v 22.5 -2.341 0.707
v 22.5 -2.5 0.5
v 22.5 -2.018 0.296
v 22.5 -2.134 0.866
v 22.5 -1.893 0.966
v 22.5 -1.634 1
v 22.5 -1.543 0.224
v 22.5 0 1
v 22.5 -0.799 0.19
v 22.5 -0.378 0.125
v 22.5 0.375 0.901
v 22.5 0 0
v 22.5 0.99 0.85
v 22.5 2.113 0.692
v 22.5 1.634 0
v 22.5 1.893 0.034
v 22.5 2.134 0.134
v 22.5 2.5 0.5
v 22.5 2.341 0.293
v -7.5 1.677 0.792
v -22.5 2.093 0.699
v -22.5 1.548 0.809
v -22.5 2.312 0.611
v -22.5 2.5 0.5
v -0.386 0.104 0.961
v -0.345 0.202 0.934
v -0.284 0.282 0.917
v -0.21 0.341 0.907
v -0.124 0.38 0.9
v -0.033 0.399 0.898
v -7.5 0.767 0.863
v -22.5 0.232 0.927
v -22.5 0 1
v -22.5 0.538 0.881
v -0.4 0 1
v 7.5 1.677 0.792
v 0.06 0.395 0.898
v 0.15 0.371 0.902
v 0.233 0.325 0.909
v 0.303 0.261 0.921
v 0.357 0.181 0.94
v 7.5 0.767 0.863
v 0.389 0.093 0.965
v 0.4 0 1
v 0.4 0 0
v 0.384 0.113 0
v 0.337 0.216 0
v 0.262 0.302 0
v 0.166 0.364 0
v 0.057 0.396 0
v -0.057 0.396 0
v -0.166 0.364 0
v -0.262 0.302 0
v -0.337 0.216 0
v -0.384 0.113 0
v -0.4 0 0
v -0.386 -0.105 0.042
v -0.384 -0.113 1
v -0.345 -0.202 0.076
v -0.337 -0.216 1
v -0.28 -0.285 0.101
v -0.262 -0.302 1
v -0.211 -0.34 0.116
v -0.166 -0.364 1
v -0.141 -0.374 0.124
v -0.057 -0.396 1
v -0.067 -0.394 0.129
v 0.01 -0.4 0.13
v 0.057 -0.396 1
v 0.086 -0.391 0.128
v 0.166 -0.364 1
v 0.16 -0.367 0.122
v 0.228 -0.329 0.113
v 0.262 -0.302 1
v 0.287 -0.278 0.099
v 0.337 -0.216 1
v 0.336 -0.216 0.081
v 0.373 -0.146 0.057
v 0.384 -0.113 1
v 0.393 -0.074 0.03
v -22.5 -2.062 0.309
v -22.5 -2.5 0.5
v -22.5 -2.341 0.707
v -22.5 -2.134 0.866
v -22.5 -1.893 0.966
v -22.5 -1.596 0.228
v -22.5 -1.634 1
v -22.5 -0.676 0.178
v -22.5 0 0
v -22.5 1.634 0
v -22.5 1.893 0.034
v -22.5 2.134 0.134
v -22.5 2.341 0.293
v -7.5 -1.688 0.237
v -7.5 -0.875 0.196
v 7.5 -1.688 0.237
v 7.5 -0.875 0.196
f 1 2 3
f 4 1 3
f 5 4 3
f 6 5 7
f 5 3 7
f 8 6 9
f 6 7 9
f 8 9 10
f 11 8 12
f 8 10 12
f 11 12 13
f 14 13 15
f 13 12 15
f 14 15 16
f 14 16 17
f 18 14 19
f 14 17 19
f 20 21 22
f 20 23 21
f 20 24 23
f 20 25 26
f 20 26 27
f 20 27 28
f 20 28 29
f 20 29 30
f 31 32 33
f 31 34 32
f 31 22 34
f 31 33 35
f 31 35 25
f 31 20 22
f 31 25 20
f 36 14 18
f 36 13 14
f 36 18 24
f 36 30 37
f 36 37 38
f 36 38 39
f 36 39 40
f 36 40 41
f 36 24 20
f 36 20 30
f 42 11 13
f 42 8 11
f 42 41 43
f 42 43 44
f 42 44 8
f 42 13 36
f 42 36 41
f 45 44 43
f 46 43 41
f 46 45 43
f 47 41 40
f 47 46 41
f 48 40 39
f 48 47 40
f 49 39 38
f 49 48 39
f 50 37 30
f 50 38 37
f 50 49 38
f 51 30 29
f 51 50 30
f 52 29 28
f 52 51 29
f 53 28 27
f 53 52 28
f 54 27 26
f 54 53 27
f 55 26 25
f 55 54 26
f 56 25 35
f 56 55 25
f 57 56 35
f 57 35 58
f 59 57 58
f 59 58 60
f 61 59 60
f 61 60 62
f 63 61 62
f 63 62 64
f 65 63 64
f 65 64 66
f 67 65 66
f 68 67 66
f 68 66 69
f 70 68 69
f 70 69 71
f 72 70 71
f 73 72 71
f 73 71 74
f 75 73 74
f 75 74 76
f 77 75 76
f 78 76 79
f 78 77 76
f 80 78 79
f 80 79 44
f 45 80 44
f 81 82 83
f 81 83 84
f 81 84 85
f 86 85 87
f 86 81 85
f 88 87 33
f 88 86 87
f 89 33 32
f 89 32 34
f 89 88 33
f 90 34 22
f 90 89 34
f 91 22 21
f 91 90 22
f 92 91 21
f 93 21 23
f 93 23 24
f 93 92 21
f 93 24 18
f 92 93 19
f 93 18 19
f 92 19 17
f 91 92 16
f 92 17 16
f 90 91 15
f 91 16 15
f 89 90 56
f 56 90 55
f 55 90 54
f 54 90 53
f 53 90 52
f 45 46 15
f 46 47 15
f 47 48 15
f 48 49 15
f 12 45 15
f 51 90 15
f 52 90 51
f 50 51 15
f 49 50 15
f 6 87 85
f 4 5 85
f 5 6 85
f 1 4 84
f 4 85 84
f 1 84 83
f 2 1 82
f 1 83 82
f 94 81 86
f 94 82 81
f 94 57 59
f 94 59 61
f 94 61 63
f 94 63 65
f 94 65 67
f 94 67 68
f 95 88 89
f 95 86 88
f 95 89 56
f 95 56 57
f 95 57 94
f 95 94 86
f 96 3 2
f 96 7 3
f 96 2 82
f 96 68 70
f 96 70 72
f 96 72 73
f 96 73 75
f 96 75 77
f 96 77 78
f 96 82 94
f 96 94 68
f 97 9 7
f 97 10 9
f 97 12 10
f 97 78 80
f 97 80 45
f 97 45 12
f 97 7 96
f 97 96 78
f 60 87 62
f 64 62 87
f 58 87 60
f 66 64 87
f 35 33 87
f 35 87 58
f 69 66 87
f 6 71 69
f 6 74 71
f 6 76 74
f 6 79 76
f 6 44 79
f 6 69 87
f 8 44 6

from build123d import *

# Parameters (mm, degrees)
SKETCH2_R           = 1.2
SKETCH2_R_2         = 0.4
BOSS_EXTRUDE1_DEPTH = 1
BOSS_EXTRUDE4_START = -1
SKETCH3_W           = 45
SKETCH3_H           = 5
SKETCH3_R           = 1.2
BOSS_EXTRUDE4_DEPTH = 1
CUT_EXTRUDE1_REACH  = 47.08
FILLET2_R           = 1


with BuildPart() as part:
    # Sketch2 → Boss-Extrude1 (new body)
    with BuildSketch(Plane.XY):
        Circle(SKETCH2_R)
        Circle(SKETCH2_R_2, mode=Mode.SUBTRACT)
    extrude(amount=BOSS_EXTRUDE1_DEPTH)

    # Sketch3 → Boss-Extrude4 (add)
    with BuildSketch(Plane.XY.offset(1).offset(BOSS_EXTRUDE4_START)):
        Rectangle(SKETCH3_W, SKETCH3_H)
        Circle(SKETCH3_R, mode=Mode.SUBTRACT)
    extrude(amount=BOSS_EXTRUDE4_DEPTH)

    # Sketch4 → Cut-Extrude1 (cut, up to next)
    with BuildSketch(Plane(origin=(22.5, 0, 0), x_dir=(0, 0, -1), z_dir=(1, 0, 0)), mode=Mode.PRIVATE) as cut_extrude1_sk1:
        with BuildLine():
            Line((0, -2.5), (0, 0))
            add(Edge.make_bspline(
                [(-0.5, -2.5), (0, -1.669206654), (-0.399128589, -0.925969653), (0, 0)],
                knots=[0, 0, 0, 0, 1, 1, 1, 1], degree=3))
            Line((-0.5, -2.5), (0, -2.5))
        make_face()
    cut_extrude1_tool1 = extrude(cut_extrude1_sk1.sketch, amount=-CUT_EXTRUDE1_REACH, mode=Mode.PRIVATE) & part.part
    # Sketch4 → Cut-Extrude1 (cut, up to next)
    with BuildSketch(Plane(origin=(22.5, 0, 0), x_dir=(0, 0, -1), z_dir=(1, 0, 0)), mode=Mode.PRIVATE) as cut_extrude1_sk2:
        with BuildLine():
            add(Edge.make_bspline(
                [(-0.5, 2.5), (-1, 1.796058275), (-0.732746225, 0.619216624), (-1, 0)],
                knots=[0, 0, 0, 0, 1, 1, 1, 1], degree=3))
            Line((-1, 0), (-1, 2.5))
            Line((-1, 2.5), (-0.5, 2.5))
        make_face()
    cut_extrude1_tool2 = extrude(cut_extrude1_sk2.sketch, amount=-CUT_EXTRUDE1_REACH, mode=Mode.PRIVATE) & part.part
    add(cut_extrude1_tool1.solids().sort_by_distance((22.5, -1.564565, 0.134605))[0], mode=Mode.SUBTRACT)
    add(cut_extrude1_tool2.solids().sort_by_distance((22.5, 1.626929, 0.874071))[0], mode=Mode.SUBTRACT)

    # Fillet2
    # the kernel refuses this fillet: 1 mm, written as the material it takes off along each edge
    with BuildSketch(Plane(origin=(-24.665063509, -2.5, 1), x_dir=(0, 1, 0), z_dir=(1, 0, 0))) as fillet2_piece_1:
        with BuildLine():
            CenterArc((0.866025404, -1), FILLET2_R, 90, 60)
            Line((0, -0.5), (-0.017320508, -0.49))
            ThreePointArc((-0.017320508, -0.49), (-0.02, -0.25), (-0.02, 0))
            Line((-0.02, 0), (0, 0.02))
            Line((0, 0.02), (0.866025404, 0.02))
            Line((0.866025404, 0.02), (0.866025404, 0))
        make_face()
    extrude(amount=49.330127019, mode=Mode.SUBTRACT)
    with BuildSketch(Plane(origin=(24.665063509, 2.5, 0), x_dir=(0, -1, 0), z_dir=(-1, 0, 0))) as fillet2_piece_2:
        with BuildLine():
            CenterArc((0.866025404, 1), FILLET2_R, 210, 60)
            Line((0, 0.5), (-0.017320508, 0.49))
            ThreePointArc((-0.017320508, 0.49), (-0.02, 0.25), (-0.02, 0))
            Line((-0.02, 0), (0, -0.02))
            Line((0, -0.02), (0.866025404, -0.02))
            Line((0.866025404, -0.02), (0.866025404, 0))
        make_face()
    extrude(amount=49.330127019, mode=Mode.SUBTRACT)


solid = part.part
